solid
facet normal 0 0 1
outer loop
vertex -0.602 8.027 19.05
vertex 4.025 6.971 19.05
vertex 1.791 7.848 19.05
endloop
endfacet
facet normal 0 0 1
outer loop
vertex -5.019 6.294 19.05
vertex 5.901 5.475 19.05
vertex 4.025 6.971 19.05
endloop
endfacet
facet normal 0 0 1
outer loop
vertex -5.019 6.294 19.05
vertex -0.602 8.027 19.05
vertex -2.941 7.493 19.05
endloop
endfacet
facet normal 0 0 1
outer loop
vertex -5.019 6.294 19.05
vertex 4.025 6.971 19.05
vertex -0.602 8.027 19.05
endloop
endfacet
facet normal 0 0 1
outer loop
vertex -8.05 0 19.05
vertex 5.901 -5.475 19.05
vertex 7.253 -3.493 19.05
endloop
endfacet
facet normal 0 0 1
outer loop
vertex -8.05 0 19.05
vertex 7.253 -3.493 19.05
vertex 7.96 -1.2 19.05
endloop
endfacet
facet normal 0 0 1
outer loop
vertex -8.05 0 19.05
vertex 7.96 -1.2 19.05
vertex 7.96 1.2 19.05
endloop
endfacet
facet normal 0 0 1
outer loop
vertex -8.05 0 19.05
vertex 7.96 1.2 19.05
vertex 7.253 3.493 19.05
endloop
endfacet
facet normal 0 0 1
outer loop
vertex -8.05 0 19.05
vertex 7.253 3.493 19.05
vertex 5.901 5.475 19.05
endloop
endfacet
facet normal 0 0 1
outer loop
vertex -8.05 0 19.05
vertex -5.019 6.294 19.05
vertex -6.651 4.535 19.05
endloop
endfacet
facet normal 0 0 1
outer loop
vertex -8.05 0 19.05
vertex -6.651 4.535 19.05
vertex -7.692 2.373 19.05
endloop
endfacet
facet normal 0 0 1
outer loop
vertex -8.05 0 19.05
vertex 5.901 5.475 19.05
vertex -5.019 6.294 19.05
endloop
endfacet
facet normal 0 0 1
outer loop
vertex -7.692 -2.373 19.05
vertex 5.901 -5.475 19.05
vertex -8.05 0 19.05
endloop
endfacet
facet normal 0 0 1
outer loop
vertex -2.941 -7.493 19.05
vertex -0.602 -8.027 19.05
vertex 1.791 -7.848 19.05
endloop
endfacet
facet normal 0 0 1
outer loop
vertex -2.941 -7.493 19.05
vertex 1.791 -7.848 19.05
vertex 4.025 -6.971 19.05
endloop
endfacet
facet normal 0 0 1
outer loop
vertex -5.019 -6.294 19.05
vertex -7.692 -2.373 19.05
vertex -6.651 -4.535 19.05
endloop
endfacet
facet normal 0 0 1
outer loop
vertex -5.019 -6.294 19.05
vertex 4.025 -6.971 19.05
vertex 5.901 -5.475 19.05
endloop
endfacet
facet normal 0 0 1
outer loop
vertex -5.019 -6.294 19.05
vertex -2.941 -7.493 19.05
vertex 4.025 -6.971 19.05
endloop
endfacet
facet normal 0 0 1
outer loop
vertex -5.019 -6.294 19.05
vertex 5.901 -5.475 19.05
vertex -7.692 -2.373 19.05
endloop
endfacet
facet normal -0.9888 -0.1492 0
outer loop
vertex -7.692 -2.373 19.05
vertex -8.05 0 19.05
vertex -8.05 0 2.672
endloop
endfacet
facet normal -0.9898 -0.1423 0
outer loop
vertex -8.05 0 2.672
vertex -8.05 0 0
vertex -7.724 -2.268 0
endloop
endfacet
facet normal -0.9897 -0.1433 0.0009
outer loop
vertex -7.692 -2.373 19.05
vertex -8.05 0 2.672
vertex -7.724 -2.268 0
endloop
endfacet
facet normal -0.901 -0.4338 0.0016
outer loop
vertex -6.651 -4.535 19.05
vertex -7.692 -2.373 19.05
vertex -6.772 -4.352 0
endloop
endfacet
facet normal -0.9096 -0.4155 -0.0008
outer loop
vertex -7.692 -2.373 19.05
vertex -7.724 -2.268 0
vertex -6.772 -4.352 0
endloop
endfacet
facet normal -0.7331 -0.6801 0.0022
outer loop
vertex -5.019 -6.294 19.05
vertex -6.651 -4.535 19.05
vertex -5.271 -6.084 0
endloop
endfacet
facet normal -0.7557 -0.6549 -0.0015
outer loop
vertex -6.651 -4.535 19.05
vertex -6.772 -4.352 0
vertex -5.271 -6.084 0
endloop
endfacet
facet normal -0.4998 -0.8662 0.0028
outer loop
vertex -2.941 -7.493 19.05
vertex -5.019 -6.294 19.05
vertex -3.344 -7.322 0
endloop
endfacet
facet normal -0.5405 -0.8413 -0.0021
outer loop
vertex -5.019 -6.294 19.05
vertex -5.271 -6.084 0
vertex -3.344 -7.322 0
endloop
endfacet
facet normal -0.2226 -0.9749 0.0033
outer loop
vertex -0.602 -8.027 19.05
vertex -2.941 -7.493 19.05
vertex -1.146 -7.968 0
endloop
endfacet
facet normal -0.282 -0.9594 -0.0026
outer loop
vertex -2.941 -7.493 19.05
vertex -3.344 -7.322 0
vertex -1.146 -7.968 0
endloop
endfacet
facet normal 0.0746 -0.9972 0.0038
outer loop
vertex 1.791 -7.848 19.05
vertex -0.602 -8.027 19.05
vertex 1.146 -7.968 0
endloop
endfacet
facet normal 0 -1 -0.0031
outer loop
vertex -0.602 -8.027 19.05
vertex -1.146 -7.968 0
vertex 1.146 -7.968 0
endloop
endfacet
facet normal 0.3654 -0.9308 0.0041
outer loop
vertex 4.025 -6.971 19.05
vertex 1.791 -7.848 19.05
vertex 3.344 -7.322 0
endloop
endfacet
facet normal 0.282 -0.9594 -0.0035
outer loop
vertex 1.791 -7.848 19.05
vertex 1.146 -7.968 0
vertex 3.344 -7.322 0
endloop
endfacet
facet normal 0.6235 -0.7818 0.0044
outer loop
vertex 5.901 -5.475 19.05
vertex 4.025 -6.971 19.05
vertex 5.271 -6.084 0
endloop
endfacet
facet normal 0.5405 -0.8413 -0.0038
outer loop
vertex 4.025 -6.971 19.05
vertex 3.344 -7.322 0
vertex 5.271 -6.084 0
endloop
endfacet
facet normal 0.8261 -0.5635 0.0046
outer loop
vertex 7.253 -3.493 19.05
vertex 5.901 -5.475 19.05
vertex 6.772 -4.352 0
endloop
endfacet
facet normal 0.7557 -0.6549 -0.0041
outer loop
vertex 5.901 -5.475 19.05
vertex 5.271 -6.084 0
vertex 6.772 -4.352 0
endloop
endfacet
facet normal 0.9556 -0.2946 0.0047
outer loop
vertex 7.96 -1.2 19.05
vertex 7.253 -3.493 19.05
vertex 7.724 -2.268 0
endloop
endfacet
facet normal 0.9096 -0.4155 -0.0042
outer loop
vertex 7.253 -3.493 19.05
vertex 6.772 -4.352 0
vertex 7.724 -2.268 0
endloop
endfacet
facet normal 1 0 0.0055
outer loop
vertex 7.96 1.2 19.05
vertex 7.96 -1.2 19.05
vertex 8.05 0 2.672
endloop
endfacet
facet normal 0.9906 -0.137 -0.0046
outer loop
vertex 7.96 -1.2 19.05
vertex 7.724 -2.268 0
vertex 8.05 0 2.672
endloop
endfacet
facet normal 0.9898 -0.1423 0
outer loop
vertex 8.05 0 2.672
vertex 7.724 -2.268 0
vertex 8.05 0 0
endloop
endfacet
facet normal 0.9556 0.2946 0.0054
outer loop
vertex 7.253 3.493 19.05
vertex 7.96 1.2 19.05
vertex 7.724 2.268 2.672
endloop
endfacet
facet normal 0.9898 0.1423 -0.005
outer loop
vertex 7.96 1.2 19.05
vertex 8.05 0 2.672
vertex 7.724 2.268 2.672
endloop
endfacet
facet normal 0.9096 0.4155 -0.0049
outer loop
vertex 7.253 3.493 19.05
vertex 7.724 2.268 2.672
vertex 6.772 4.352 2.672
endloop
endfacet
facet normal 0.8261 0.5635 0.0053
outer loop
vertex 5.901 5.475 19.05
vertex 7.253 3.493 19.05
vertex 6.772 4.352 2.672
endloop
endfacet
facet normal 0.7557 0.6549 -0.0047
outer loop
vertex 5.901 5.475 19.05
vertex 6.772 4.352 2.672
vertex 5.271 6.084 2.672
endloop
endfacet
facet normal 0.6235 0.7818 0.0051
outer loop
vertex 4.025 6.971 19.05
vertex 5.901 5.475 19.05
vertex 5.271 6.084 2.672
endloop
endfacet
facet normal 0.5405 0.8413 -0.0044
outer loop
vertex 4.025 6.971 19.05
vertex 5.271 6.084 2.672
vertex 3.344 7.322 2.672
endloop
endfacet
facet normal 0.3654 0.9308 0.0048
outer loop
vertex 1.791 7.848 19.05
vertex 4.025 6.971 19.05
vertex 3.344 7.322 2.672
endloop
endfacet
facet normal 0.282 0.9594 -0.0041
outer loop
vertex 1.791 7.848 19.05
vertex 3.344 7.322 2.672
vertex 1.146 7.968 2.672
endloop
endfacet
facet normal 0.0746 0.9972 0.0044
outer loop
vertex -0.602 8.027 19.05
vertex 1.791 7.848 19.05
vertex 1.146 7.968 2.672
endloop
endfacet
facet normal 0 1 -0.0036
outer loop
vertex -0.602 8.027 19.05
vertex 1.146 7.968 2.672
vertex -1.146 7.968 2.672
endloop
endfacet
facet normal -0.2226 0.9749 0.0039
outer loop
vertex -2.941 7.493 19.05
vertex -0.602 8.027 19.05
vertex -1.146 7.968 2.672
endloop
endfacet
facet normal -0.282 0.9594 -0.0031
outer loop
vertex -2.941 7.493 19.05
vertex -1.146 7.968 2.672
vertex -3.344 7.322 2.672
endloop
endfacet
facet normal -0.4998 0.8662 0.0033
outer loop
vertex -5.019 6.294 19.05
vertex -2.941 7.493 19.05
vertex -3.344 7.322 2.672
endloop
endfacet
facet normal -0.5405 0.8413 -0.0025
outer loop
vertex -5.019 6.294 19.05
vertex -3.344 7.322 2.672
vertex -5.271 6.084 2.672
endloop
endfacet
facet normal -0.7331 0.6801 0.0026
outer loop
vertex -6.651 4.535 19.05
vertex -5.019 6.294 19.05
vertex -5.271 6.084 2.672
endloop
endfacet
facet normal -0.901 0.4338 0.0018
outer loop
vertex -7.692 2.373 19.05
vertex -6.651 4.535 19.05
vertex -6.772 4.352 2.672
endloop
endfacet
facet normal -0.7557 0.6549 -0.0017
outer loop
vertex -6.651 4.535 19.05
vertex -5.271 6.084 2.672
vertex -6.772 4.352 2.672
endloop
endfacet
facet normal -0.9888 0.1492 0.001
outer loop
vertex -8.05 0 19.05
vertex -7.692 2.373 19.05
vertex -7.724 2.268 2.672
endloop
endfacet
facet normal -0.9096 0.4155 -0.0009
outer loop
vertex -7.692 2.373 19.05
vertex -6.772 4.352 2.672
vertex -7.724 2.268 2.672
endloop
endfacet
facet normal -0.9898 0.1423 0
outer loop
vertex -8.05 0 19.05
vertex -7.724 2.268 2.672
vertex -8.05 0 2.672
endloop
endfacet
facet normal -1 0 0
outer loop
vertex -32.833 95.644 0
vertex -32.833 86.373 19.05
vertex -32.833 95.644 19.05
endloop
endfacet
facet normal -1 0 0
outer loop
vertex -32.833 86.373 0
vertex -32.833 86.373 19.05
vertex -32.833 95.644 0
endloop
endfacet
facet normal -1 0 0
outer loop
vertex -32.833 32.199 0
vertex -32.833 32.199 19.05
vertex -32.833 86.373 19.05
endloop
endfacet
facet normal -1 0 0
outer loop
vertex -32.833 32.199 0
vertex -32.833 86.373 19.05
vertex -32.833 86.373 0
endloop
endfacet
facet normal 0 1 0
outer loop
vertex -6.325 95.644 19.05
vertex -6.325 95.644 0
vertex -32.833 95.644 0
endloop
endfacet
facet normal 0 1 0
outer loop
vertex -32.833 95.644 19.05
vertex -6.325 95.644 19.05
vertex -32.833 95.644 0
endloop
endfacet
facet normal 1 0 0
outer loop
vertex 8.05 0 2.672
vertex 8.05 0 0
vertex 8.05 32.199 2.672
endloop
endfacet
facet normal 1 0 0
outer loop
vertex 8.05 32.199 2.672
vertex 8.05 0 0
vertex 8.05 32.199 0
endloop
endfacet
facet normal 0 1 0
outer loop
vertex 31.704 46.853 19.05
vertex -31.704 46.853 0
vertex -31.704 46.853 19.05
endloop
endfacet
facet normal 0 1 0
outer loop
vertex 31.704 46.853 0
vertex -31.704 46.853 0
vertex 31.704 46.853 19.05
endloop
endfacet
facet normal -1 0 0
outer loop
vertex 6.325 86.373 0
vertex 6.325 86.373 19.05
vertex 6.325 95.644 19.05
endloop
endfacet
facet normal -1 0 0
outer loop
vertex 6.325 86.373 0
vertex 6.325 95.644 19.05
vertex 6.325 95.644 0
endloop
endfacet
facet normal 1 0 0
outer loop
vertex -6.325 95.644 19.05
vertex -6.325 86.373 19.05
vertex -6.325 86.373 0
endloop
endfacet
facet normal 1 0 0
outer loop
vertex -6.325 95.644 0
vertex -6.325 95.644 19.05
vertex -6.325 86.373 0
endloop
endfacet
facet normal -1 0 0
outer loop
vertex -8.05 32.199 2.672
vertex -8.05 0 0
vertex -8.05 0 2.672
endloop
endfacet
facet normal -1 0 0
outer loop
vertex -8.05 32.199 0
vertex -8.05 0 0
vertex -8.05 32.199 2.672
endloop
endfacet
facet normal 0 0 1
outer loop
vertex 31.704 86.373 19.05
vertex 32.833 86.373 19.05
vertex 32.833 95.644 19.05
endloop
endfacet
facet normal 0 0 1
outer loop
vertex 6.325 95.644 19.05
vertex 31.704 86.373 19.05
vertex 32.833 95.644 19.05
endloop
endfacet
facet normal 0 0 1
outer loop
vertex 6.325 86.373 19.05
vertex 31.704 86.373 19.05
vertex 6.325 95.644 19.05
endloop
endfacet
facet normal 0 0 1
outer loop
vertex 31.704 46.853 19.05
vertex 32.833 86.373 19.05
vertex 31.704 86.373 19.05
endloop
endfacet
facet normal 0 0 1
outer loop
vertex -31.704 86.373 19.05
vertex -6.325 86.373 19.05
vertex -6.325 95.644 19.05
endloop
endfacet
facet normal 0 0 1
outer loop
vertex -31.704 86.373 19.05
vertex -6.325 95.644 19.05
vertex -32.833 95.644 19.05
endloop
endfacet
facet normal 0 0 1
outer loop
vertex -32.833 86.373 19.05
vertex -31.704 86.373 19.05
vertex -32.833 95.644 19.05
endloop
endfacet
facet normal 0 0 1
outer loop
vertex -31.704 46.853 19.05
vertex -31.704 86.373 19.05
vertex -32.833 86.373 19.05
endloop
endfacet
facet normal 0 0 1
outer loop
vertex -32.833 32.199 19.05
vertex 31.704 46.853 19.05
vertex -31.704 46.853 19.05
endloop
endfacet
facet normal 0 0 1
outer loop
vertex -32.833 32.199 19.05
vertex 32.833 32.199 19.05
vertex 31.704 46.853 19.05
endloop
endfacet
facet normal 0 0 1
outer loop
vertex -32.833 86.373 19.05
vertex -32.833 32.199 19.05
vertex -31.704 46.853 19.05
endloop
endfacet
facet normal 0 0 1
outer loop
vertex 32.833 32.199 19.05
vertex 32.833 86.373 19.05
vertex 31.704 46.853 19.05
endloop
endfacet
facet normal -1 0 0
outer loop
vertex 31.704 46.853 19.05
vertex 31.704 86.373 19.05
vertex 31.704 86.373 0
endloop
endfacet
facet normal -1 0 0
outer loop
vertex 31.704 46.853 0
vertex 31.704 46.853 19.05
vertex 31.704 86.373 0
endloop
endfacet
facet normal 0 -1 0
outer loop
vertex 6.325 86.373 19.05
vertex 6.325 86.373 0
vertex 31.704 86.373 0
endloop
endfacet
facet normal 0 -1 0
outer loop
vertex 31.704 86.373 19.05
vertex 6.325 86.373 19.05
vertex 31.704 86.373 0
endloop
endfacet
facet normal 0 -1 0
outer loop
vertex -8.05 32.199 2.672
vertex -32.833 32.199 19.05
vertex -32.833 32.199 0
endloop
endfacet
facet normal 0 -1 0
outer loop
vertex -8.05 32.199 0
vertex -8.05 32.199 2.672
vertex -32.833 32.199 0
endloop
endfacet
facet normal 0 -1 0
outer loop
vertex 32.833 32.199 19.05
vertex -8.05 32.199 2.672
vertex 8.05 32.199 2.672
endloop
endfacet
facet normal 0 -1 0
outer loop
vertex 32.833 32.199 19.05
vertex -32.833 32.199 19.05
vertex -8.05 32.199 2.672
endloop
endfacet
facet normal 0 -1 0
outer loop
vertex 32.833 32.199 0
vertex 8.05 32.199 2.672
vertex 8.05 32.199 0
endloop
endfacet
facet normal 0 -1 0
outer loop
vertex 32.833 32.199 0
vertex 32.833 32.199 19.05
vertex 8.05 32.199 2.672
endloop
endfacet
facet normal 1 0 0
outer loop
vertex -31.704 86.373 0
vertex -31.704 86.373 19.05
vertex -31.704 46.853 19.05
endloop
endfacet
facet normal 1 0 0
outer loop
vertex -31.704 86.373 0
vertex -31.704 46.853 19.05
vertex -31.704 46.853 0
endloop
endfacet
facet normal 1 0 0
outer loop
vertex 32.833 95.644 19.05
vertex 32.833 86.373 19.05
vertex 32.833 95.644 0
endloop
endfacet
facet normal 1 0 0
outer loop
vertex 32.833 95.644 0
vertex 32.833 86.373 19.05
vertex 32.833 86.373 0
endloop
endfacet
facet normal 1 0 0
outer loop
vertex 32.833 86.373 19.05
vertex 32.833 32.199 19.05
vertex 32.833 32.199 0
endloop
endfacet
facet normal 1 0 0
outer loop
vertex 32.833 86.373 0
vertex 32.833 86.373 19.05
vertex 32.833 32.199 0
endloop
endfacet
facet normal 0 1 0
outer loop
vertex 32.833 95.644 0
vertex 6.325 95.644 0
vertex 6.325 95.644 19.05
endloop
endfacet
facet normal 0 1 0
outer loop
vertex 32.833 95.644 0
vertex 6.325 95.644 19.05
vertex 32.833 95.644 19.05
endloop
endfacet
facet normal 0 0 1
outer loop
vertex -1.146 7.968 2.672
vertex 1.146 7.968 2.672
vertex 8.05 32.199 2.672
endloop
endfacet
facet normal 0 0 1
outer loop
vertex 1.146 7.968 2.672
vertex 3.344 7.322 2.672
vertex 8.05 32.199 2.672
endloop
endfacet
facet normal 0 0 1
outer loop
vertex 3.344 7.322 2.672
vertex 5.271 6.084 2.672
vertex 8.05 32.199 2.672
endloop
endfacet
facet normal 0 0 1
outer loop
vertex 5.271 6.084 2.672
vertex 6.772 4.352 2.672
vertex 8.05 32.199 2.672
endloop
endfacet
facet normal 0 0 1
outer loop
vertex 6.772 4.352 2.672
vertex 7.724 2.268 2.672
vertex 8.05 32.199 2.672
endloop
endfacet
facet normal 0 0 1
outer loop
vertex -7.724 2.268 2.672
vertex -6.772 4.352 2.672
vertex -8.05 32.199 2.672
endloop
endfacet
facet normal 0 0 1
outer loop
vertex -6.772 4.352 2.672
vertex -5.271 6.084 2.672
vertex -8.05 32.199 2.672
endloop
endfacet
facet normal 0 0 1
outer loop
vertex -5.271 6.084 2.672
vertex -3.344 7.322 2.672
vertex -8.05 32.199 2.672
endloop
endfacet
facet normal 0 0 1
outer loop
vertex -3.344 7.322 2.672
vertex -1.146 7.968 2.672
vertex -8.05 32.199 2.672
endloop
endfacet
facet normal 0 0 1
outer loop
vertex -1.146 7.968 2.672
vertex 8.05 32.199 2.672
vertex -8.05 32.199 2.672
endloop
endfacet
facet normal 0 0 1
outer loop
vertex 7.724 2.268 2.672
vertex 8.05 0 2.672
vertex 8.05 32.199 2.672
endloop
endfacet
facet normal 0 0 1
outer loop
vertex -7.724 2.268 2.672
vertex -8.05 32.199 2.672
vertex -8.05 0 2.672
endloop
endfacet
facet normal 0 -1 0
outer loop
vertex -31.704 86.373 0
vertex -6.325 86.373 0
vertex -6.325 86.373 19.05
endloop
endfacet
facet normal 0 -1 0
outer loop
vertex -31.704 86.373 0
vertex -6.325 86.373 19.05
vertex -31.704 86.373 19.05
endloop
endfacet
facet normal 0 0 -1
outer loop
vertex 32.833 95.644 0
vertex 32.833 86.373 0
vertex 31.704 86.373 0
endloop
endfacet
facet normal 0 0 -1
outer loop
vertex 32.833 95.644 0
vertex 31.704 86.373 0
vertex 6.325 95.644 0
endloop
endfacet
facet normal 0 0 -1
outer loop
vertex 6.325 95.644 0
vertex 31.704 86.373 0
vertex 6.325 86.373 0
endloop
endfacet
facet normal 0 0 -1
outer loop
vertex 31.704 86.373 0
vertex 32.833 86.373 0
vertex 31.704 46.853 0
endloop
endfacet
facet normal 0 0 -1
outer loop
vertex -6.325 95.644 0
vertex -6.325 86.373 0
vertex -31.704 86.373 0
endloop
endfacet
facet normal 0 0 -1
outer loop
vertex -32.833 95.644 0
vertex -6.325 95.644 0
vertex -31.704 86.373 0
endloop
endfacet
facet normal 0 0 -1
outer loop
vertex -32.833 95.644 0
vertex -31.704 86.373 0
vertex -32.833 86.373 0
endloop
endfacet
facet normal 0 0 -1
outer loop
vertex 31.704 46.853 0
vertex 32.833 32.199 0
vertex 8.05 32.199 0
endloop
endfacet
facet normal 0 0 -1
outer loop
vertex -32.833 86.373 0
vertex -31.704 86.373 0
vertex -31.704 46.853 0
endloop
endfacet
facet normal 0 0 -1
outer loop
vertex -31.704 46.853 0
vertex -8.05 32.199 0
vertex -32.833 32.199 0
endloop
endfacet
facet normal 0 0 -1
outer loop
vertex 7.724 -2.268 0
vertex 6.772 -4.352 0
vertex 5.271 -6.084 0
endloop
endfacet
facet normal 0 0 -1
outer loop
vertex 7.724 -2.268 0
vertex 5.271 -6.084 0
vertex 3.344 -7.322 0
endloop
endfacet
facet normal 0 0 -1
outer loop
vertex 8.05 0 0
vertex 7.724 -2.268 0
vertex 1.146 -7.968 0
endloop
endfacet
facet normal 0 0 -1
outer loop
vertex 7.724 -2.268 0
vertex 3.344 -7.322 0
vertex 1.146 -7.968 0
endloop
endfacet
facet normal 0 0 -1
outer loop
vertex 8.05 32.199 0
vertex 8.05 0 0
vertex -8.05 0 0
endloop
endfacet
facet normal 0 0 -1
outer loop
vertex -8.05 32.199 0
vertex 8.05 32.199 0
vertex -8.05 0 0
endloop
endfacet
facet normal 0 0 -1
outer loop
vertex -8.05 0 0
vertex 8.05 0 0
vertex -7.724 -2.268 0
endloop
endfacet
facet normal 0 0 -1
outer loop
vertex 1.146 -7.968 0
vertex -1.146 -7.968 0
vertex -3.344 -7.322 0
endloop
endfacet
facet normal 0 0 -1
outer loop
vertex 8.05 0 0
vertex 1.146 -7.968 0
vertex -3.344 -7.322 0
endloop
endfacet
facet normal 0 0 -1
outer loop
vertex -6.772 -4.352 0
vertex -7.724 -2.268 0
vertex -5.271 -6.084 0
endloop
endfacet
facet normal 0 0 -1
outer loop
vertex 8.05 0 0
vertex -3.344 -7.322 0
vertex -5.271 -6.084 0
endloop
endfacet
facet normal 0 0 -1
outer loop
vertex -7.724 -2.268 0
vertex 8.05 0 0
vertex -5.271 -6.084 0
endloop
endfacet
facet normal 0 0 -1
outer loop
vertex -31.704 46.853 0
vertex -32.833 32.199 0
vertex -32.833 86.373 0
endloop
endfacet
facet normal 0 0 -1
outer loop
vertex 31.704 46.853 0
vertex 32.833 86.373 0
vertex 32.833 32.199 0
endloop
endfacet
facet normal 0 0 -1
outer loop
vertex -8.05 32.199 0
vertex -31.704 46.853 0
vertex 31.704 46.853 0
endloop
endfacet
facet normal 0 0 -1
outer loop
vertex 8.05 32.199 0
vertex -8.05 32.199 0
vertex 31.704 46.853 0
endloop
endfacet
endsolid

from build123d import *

# Parameters (mm, degrees)
SKETCH2_R           = 8.049775325
BOSS_EXTRUDE1_DEPTH = 19.05
SKETCH3_W           = 16.09955065
SKETCH3_H           = 32.199101299
BOSS_EXTRUDE2_DEPTH = 2.671544542
SKETCH4_W           = 63.40856
SKETCH4_H           = 19.05
BOSS_EXTRUDE3_DEPTH = 14.654134452
SKETCH5_W           = 19.05
SKETCH5_H           = 54.17415065
BOSS_EXTRUDE4_DEPTH = 1.128888889
SKETCH6_W           = 26.508568889
SKETCH6_H           = 19.05
BOSS_EXTRUDE5_DEPTH = 9.271057991


with BuildPart() as part:
    # Sketch2 → Boss-Extrude1 (new body)
    with BuildSketch(Plane.XY):
        with Locations(Location((0, 0, 0), (0, 0, 180))):
            Circle(SKETCH2_R)
    extrude(amount=BOSS_EXTRUDE1_DEPTH)

    # Sketch3 → Boss-Extrude2 (add)
    with BuildSketch(Plane(origin=(0, 0, 0), x_dir=(-1, 0, 0), z_dir=(0, 0, -1))):
        with Locations((0, 16.099550649)):
            Rectangle(SKETCH3_W, SKETCH3_H)
    extrude(amount=-BOSS_EXTRUDE2_DEPTH)

    # Sketch4 → Boss-Extrude3 (add)
    with BuildSketch(Plane(origin=(0, 32.199101299, 0), x_dir=(1, 0, 0), z_dir=(0, 1, 0))):
        with Locations((0, -9.525)):
            Rectangle(SKETCH4_W, SKETCH4_H)
    extrude(amount=BOSS_EXTRUDE3_DEPTH)

    # Sketch5 → Boss-Extrude4 (add)
    with BuildSketch(Plane(origin=(31.70428, 0, 0), x_dir=(0, 0, -1), z_dir=(1, 0, 0))):
        with Locations((-9.525, 59.286176624)):
            Rectangle(SKETCH5_W, SKETCH5_H)
    boss_extrude4 = extrude(amount=BOSS_EXTRUDE4_DEPTH)

    # Mirror1: Boss-Extrude4 across plane
    add(boss_extrude4.mirror(Plane(origin=(0, 0, 0), x_dir=(0, 0, 1), z_dir=(1, 0, 0))))

    # Sketch6 → Boss-Extrude5 (add)
    with BuildSketch(Plane(origin=(0, 86.373251949, 0), x_dir=(1, 0, 0), z_dir=(0, 1, 0))):
        with Locations((19.578884444, -9.525)):
            Rectangle(SKETCH6_W, SKETCH6_H)
    boss_extrude5 = extrude(amount=BOSS_EXTRUDE5_DEPTH)

    # Mirror2: Boss-Extrude4, Boss-Extrude5 across plane
    add(boss_extrude4.mirror(Plane(origin=(0, 0, 0), x_dir=(0, 0, 1), z_dir=(1, 0, 0))))
    add(boss_extrude5.mirror(Plane(origin=(0, 0, 0), x_dir=(0, 0, 1), z_dir=(1, 0, 0))))


solid = part.part
